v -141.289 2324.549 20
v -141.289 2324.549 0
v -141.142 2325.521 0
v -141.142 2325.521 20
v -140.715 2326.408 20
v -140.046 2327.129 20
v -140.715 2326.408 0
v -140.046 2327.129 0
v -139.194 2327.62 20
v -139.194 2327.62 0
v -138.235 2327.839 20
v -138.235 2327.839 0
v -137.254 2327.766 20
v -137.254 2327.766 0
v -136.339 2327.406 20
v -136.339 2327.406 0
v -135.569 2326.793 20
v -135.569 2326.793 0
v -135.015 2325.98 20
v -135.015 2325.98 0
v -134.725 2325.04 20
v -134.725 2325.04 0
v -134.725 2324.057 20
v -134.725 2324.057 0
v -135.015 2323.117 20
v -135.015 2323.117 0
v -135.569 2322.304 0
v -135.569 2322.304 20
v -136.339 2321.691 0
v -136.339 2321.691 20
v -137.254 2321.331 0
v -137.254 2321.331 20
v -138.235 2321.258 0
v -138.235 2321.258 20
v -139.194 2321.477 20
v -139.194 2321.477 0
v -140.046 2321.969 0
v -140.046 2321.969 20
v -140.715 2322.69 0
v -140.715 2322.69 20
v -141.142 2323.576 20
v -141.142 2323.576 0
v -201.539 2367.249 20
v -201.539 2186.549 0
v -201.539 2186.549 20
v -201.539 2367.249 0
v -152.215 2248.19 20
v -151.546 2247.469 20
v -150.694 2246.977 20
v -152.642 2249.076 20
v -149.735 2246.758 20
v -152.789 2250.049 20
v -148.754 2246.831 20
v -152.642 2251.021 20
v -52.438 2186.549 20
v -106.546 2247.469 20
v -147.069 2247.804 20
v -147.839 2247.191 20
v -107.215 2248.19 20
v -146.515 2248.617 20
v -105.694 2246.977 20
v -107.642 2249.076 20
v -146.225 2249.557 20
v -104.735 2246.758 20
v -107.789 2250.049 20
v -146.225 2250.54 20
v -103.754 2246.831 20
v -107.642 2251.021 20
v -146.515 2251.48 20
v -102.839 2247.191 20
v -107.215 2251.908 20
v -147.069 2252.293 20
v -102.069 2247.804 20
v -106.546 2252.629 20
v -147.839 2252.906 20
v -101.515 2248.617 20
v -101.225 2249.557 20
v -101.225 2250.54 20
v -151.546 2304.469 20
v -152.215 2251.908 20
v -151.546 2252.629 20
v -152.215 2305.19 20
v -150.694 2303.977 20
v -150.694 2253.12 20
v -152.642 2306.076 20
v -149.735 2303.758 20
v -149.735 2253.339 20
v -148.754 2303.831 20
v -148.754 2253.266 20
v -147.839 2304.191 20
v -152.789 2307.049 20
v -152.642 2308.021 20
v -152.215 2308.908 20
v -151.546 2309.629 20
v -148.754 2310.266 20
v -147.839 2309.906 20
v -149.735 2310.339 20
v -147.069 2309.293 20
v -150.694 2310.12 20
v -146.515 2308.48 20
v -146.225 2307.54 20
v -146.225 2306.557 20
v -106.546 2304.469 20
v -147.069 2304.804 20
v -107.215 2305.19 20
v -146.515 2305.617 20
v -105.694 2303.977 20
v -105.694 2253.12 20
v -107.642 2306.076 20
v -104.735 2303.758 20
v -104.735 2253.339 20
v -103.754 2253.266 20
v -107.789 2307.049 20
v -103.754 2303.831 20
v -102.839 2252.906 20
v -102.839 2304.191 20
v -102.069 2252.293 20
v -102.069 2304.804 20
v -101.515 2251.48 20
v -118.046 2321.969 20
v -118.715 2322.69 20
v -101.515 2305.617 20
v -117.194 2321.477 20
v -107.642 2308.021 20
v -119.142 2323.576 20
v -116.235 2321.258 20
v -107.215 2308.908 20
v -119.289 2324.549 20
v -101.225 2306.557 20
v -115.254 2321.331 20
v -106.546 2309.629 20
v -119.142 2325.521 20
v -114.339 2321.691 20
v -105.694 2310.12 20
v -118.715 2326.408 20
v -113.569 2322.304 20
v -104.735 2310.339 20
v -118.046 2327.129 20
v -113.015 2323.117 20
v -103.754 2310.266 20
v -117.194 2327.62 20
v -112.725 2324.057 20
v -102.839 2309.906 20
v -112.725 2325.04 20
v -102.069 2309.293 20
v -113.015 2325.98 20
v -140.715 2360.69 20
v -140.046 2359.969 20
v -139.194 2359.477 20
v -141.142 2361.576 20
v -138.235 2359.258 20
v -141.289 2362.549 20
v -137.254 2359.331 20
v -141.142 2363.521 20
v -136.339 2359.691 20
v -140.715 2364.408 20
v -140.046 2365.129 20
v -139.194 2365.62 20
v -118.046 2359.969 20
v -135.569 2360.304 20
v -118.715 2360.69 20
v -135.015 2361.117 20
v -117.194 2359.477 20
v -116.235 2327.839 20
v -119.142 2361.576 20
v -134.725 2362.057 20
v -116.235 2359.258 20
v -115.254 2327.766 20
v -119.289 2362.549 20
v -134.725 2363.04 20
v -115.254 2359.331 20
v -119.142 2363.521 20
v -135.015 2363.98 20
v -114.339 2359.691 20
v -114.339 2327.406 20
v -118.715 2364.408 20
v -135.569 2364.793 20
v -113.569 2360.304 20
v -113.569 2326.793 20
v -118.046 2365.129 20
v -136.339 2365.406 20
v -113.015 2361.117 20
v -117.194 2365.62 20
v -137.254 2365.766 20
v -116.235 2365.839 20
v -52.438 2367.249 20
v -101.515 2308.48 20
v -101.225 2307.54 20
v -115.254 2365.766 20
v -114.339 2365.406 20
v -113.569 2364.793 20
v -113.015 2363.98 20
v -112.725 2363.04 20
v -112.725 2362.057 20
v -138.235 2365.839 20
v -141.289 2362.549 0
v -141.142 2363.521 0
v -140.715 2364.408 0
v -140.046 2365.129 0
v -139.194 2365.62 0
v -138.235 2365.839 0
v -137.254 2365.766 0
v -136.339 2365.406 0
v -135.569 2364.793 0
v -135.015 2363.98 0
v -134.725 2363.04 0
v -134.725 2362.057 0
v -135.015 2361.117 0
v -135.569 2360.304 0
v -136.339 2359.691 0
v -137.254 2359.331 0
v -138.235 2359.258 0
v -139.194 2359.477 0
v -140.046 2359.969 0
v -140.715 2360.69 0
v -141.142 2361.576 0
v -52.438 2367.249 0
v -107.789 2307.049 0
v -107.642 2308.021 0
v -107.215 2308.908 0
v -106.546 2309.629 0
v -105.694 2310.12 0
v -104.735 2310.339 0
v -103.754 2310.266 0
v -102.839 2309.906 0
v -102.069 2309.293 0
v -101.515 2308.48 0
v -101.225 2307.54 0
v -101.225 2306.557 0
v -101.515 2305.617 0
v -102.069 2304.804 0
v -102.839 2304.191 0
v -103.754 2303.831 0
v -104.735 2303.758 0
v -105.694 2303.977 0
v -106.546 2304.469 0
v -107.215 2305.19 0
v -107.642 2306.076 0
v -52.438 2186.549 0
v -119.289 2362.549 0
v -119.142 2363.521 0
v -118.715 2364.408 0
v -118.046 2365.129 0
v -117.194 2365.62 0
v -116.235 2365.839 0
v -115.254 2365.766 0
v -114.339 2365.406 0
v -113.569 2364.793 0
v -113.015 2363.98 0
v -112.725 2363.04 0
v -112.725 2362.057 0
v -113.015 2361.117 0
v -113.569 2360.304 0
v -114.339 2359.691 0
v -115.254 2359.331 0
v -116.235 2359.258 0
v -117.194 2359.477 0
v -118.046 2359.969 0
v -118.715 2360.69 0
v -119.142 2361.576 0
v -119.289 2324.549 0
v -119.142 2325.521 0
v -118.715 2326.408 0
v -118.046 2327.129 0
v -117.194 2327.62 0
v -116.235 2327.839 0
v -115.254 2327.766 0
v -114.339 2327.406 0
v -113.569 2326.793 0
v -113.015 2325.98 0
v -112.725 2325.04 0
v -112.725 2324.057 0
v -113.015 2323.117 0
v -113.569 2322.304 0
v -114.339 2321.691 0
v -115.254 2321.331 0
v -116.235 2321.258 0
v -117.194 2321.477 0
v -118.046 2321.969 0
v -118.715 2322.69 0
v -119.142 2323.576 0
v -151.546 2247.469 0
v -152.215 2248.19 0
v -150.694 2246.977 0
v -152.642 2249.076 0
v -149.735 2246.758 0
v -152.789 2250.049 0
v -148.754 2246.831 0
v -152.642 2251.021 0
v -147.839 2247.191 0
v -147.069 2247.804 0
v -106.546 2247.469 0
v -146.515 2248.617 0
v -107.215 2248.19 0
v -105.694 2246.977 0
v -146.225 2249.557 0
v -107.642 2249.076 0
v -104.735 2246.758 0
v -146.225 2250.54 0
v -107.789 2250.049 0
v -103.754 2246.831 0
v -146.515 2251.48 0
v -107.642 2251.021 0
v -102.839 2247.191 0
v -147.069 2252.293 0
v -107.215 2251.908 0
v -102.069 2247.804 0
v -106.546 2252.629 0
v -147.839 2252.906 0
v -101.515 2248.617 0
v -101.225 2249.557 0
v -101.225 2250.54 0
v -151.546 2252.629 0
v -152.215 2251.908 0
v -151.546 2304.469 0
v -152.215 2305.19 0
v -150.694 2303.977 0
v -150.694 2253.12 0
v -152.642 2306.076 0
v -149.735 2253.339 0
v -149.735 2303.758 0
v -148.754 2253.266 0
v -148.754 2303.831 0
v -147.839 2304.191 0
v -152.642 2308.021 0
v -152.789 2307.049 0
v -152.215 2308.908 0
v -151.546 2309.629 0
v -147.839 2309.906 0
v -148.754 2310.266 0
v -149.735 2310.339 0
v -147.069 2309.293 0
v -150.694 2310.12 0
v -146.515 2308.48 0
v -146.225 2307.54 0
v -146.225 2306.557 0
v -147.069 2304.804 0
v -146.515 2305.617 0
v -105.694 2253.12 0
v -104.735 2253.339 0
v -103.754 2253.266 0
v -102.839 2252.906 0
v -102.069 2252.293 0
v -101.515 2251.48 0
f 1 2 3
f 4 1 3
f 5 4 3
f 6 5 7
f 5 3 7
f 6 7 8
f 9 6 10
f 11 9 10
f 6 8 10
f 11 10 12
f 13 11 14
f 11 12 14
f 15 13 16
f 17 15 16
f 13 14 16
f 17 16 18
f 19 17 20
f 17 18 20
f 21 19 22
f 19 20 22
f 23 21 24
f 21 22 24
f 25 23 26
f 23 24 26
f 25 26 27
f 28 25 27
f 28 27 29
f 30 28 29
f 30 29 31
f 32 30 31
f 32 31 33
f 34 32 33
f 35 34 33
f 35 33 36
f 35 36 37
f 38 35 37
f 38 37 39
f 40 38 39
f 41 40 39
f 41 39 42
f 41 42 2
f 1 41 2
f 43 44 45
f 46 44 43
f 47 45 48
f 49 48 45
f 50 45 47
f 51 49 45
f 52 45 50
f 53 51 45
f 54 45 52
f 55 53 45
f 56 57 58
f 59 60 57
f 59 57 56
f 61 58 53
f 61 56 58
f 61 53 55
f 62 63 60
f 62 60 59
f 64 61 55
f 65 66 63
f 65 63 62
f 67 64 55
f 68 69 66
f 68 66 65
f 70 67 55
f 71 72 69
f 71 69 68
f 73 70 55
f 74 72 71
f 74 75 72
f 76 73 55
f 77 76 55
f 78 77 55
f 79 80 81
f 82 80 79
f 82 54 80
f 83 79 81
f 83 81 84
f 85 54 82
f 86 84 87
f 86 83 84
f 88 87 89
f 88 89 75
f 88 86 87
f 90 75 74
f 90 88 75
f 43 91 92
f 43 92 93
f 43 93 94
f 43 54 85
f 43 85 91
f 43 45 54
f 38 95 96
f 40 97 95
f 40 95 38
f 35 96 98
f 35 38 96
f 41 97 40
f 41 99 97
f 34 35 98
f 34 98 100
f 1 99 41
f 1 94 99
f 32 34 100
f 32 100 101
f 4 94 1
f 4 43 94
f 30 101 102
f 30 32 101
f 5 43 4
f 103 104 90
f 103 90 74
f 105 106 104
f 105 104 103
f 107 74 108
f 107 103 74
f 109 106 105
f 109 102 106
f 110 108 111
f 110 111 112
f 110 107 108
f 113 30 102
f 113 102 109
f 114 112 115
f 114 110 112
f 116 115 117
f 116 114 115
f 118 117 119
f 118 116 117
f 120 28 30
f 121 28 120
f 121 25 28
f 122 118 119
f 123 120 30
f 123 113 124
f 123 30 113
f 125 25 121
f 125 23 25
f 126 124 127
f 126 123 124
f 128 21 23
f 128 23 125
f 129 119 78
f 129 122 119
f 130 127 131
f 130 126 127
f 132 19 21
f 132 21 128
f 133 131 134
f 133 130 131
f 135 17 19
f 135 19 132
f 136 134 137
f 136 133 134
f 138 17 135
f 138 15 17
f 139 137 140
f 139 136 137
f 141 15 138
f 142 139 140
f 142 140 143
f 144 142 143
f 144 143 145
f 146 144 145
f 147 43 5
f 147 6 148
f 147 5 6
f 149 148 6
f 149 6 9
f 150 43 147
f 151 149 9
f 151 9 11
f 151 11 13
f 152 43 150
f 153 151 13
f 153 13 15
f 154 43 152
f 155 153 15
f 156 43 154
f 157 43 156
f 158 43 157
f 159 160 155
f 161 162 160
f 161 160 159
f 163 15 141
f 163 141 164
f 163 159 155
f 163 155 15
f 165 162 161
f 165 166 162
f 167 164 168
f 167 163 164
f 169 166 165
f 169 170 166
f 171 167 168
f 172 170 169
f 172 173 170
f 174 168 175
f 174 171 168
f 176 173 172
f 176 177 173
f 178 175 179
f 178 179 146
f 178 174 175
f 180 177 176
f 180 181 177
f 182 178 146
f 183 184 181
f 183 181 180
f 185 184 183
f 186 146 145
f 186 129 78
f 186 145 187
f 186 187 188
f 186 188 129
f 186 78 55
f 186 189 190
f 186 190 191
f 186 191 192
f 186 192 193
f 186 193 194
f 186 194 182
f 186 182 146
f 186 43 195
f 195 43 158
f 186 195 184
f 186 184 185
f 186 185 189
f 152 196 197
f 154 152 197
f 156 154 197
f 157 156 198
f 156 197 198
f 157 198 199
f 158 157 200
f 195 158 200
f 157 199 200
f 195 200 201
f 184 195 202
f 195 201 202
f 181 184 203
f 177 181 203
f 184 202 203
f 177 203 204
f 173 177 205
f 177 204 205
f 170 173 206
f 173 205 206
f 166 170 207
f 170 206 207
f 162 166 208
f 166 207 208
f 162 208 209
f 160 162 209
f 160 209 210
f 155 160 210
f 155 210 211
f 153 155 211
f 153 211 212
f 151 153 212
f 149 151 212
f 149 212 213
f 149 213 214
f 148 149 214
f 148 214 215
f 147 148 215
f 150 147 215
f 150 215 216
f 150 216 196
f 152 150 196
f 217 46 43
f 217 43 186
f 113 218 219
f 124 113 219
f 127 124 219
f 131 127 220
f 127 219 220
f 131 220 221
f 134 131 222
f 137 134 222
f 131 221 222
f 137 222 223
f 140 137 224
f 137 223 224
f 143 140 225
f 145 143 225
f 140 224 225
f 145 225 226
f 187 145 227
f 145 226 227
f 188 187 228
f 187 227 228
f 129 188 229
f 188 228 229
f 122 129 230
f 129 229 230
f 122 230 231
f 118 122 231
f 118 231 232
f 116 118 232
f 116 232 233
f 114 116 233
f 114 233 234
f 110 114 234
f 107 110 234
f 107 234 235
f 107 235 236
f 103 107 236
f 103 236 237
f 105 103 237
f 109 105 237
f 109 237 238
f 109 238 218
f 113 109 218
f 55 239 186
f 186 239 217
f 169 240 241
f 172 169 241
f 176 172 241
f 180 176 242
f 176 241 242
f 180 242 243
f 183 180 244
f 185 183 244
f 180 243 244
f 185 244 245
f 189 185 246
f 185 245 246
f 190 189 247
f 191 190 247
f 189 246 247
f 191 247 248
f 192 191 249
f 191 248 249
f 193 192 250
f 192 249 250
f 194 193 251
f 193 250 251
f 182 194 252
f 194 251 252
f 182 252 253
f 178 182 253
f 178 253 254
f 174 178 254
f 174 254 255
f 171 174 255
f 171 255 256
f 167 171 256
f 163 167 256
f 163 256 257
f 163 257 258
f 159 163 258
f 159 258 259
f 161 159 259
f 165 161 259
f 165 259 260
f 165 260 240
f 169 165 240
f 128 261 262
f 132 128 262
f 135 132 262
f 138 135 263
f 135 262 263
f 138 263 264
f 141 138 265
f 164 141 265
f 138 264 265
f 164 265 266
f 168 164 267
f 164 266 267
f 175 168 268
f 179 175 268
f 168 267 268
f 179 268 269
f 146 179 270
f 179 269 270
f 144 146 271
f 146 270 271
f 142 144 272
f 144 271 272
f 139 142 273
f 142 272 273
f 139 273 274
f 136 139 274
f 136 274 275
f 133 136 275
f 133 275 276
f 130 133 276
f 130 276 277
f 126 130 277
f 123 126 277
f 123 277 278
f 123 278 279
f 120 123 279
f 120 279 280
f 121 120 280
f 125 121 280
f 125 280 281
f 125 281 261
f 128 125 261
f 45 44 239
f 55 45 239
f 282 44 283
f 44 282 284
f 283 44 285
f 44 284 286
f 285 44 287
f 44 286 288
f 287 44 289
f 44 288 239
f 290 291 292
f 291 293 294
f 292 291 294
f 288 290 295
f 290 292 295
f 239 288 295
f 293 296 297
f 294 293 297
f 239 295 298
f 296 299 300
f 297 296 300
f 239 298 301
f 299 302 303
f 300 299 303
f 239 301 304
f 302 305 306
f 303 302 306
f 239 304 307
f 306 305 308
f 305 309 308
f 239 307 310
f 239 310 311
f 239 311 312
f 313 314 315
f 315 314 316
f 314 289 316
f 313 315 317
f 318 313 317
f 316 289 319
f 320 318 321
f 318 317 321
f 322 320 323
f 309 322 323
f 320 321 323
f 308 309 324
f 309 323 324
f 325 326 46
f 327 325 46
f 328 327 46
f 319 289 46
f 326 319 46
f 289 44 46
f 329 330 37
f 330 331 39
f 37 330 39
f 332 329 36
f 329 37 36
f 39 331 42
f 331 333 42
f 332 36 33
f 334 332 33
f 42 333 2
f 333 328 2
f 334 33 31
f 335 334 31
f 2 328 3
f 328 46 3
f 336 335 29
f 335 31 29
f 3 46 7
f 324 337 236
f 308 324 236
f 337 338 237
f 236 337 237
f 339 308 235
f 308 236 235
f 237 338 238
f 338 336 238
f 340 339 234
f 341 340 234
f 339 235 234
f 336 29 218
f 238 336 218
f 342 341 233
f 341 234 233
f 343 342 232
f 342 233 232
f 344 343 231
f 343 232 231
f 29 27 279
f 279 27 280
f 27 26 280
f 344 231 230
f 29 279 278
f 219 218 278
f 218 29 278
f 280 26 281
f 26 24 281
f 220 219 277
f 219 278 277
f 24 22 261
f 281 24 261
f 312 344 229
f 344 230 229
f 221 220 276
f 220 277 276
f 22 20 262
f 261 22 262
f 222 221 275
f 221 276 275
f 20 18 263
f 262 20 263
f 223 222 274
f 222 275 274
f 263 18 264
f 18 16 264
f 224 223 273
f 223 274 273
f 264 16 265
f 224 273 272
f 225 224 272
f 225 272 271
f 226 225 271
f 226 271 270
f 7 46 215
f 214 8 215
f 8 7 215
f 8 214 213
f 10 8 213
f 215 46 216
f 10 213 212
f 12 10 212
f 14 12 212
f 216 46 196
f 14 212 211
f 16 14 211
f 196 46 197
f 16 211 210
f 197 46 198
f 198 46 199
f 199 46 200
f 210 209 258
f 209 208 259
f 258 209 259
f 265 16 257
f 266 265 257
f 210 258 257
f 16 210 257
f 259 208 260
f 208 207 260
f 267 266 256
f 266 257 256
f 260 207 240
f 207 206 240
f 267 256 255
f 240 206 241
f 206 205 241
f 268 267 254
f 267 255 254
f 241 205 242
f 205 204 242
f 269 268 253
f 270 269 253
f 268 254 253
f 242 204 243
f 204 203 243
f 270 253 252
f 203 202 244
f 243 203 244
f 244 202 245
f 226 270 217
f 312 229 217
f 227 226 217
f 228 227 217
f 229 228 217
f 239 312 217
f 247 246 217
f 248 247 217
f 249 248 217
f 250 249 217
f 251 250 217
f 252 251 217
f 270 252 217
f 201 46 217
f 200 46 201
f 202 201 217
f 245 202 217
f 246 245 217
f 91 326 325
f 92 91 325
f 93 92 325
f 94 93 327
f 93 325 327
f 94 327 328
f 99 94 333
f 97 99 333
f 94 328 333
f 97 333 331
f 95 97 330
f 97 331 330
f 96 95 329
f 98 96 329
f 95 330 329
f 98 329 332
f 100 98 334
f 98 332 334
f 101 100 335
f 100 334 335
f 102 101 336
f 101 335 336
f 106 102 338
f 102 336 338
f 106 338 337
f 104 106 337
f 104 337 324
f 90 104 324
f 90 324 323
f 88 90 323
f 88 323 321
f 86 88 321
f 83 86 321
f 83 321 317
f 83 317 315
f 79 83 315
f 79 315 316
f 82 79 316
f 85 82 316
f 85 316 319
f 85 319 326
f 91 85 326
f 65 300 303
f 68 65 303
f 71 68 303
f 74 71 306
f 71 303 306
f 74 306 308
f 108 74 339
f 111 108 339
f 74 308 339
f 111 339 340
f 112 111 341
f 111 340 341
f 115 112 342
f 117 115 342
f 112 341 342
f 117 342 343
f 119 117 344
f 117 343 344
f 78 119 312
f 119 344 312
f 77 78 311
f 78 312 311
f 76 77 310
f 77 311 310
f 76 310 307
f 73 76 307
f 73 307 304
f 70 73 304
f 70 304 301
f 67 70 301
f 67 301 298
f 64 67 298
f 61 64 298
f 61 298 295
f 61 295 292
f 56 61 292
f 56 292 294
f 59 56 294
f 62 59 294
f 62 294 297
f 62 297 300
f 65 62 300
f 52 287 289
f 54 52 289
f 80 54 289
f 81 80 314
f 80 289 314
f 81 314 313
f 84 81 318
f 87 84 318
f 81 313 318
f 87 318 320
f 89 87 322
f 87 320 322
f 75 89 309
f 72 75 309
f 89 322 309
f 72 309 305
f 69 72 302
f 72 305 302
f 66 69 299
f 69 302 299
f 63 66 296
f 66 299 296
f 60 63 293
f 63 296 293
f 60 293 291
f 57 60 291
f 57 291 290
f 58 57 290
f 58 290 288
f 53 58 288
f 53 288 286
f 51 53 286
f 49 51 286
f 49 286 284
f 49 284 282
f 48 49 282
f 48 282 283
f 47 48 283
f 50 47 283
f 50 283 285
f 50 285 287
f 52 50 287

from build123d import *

# Parameters (mm, degrees)
SKETCH1_W                = 149.100450595
SKETCH1_H                = 180.7
BOSS_EXTRUDE1_DEPTH      = 20
M6_CLEARANCE_HOLE1_D     = 6.6
M6_CLEARANCE_HOLE1_DEPTH = 36.6
M6_CLEARANCE_HOLE1_TIP   = 1.982840043


with BuildPart() as part:
    # Sketch1 → Boss-Extrude1 (new body)
    with BuildSketch(Plane.XY):
        with Locations((-126.988568818, 2276.898566852)):
            Rectangle(SKETCH1_W, SKETCH1_H)
    extrude(amount=BOSS_EXTRUDE1_DEPTH)

    # M6 Clearance Hole1
    with Locations(Plane.XY.offset(20)):
        with Locations((-149.488568817, 2307.048566852), (-104.488568817, 2307.048566852), (-104.488568817, 2250.048566852), (-149.488568817, 2250.048566852), (-137.988568818, 2362.548566852), (-137.988568818, 2324.548566852), (-115.988568818, 2324.548566852), (-115.988568818, 2362.548566852)):
            Hole(M6_CLEARANCE_HOLE1_D / 2, depth=M6_CLEARANCE_HOLE1_DEPTH)
            with Locations((0, 0, -(M6_CLEARANCE_HOLE1_DEPTH + M6_CLEARANCE_HOLE1_TIP / 2))):  # 118° drill point
                Cone(0, M6_CLEARANCE_HOLE1_D / 2, M6_CLEARANCE_HOLE1_TIP, mode=Mode.SUBTRACT)


solid = part.part
